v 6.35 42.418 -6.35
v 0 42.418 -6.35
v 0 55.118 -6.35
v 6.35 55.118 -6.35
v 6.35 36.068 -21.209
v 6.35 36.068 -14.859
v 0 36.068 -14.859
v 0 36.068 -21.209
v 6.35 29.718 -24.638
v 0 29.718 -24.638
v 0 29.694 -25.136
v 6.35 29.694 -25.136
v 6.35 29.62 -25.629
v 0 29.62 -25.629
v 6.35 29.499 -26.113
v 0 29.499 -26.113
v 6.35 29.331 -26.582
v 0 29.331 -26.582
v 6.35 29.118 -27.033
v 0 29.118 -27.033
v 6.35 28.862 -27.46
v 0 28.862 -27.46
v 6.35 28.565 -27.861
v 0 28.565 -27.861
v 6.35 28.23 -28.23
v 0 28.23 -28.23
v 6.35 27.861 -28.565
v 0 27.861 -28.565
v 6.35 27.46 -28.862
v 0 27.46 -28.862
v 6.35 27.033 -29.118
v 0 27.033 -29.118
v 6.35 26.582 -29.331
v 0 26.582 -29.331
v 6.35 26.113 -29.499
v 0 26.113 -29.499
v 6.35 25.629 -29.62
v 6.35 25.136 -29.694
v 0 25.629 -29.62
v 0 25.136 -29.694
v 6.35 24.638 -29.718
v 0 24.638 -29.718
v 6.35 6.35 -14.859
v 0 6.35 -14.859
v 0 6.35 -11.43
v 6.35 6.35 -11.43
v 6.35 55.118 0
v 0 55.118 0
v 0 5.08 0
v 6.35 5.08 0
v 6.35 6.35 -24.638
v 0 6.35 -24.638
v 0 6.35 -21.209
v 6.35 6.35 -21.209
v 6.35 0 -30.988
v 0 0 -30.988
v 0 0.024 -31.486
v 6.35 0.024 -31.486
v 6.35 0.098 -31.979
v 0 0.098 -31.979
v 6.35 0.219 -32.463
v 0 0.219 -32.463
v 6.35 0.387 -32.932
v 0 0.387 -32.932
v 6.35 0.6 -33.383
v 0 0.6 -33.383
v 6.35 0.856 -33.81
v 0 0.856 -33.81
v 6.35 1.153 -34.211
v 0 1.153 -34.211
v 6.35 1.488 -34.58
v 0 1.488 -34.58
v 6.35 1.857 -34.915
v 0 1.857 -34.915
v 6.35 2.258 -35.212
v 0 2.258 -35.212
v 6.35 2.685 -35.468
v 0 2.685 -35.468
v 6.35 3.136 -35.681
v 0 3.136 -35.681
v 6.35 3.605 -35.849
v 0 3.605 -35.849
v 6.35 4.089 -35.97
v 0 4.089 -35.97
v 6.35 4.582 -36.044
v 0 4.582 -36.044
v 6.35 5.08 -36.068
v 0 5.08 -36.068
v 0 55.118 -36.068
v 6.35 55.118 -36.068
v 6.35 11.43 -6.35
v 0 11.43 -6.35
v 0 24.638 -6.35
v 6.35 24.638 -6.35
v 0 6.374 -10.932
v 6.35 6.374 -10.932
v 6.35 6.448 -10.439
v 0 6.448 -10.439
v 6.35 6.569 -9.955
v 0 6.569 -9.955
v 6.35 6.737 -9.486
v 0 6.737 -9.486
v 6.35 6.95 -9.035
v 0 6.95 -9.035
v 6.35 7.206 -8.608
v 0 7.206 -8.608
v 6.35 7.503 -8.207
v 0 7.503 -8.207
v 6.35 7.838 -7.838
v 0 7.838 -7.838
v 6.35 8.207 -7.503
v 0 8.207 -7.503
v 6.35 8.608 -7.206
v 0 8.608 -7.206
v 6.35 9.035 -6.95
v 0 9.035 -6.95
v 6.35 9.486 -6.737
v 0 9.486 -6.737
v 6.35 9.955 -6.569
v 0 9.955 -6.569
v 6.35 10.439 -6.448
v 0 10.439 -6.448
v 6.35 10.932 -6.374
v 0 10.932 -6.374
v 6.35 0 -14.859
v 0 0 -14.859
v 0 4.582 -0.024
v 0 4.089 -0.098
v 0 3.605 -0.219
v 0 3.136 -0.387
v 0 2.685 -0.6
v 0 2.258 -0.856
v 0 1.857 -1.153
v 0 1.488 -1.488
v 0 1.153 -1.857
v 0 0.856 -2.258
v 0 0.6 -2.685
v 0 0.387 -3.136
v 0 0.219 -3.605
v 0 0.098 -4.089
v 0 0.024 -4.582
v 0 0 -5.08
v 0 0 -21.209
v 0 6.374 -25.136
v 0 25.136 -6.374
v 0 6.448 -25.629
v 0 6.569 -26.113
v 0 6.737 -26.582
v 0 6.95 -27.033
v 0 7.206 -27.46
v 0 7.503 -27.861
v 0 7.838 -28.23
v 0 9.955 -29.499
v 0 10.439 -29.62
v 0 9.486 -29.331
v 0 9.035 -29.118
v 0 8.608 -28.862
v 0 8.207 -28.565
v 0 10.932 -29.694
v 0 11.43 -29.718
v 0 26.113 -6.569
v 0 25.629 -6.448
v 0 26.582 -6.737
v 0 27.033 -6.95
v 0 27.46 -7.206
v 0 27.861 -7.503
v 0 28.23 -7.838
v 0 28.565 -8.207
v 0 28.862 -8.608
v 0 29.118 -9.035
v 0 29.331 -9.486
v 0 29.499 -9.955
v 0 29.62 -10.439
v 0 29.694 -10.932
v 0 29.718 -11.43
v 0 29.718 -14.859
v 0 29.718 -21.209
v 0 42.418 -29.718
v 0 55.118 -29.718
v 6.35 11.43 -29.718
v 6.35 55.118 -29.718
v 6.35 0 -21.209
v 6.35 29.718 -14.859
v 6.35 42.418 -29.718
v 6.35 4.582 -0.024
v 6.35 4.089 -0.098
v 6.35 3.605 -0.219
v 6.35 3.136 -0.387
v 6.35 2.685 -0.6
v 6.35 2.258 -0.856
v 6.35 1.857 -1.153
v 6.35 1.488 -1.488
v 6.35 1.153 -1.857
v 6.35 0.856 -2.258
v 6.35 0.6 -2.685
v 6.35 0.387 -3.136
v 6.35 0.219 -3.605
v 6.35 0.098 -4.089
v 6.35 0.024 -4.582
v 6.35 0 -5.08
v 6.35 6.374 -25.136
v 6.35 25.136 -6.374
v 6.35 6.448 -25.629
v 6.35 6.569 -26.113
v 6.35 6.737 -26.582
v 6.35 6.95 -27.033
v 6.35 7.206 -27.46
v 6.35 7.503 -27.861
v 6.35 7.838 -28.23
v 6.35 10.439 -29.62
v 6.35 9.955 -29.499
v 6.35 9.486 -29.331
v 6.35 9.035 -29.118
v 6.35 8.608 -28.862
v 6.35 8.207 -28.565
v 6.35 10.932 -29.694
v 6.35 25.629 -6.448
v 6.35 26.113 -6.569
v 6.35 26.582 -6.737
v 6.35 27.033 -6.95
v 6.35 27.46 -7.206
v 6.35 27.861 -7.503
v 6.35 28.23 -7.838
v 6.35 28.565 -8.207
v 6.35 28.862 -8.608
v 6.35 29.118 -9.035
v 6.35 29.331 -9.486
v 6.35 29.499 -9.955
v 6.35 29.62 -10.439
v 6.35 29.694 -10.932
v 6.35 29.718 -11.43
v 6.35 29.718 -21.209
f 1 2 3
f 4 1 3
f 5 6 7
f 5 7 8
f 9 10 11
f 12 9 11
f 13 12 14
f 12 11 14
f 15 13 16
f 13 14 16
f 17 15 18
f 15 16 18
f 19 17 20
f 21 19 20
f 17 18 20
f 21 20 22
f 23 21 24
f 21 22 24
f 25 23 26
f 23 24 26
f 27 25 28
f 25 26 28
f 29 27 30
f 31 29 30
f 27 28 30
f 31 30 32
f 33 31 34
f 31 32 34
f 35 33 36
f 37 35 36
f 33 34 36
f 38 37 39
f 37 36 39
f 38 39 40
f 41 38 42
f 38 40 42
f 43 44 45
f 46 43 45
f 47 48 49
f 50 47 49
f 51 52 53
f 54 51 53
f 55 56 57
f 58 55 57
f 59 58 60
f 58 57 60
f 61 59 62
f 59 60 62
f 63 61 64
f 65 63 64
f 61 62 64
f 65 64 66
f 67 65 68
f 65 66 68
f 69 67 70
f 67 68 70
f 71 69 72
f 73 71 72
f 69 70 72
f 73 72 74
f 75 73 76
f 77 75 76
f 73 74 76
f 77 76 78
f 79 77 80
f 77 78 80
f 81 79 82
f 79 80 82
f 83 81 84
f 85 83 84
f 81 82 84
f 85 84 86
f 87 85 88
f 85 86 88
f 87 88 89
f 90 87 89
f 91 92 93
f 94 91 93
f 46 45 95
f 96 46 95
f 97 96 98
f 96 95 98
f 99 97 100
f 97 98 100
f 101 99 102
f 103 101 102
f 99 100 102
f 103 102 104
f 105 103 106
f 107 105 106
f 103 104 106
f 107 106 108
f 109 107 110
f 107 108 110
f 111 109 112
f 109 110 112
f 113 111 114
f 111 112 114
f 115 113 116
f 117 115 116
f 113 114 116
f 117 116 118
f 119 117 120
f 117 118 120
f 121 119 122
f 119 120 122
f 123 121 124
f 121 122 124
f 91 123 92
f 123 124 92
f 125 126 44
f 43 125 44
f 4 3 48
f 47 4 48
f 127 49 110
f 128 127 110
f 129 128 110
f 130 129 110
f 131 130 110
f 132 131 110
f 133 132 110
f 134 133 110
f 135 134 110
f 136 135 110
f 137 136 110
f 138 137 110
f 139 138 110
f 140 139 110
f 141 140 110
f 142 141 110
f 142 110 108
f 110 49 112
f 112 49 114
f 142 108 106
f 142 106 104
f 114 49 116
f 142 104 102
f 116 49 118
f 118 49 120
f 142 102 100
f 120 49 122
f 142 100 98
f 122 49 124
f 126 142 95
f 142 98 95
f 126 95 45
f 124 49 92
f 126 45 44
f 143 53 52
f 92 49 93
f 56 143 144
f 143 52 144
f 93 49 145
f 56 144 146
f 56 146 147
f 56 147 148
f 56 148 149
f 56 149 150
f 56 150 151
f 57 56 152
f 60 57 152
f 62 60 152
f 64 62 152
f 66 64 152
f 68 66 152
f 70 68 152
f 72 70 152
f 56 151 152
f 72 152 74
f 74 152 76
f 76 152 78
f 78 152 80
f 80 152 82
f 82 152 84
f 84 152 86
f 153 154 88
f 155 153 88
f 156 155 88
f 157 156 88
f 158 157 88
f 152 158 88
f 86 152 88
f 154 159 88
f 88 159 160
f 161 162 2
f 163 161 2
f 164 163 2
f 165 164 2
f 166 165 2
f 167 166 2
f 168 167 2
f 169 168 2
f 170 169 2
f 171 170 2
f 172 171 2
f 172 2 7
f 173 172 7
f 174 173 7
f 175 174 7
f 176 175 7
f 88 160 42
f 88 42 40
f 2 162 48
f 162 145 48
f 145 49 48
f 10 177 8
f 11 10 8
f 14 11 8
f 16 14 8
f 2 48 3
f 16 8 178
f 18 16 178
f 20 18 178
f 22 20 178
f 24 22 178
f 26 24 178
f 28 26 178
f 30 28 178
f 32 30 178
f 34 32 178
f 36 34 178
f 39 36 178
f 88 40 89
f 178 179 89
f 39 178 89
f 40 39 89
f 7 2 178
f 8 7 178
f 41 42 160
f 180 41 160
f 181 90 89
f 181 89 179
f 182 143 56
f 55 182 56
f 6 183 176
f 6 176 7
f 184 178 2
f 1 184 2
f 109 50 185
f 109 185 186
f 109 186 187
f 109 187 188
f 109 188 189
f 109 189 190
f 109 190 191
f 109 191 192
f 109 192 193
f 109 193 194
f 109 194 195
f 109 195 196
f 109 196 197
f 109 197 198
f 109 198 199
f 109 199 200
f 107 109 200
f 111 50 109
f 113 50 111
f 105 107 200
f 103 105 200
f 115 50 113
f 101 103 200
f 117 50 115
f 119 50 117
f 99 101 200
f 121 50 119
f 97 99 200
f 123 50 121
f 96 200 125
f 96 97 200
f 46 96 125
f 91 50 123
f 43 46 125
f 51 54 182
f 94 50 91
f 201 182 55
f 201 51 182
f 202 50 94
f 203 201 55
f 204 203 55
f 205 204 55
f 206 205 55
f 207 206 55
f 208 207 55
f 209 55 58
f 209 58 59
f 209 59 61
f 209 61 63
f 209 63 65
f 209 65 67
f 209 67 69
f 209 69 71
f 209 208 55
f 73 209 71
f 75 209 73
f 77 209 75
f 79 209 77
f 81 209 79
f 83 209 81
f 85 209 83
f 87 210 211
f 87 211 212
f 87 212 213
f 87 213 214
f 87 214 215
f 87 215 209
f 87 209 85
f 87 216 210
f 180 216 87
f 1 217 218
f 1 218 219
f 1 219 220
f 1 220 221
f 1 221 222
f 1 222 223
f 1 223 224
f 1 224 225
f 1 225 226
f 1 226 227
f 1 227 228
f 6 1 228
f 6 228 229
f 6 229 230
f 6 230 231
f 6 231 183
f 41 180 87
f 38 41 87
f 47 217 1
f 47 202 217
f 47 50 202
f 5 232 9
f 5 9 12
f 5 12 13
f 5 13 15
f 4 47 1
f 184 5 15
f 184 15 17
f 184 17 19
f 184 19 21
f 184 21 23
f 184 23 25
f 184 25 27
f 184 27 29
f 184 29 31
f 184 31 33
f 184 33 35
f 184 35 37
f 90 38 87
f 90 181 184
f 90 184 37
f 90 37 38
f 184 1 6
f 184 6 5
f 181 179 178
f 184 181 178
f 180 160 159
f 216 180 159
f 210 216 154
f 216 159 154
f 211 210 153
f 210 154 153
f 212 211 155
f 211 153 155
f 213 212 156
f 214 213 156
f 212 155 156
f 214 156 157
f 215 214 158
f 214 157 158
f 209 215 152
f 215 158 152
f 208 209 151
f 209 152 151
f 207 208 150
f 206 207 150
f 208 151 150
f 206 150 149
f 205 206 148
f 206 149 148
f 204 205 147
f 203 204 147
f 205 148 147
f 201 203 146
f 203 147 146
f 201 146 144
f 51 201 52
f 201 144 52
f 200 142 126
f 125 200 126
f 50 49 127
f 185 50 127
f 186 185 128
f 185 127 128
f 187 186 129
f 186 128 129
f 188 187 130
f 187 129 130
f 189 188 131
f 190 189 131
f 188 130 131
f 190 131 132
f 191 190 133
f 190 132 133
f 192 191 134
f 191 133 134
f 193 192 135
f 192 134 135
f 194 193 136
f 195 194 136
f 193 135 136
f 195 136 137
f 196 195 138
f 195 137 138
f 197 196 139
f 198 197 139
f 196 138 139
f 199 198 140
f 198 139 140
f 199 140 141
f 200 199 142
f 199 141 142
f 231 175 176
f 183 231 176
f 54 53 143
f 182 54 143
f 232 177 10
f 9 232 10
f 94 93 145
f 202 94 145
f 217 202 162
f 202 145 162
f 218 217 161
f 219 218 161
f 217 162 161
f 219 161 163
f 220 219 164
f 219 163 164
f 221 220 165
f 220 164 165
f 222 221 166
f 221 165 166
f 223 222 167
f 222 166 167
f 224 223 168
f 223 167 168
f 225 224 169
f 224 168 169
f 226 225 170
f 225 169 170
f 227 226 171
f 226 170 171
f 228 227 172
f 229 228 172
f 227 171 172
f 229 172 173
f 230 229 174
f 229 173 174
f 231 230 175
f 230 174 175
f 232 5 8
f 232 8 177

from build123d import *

# Parameters (mm, degrees)
BOSS_EXTRUDE1_DEPTH = 6.35


with BuildPart() as part:
    # Sketch2 → Boss-Extrude1 (new body)
    with BuildSketch(Plane(origin=(0, 0, 0), x_dir=(0, 0, -1), z_dir=(1, 0, 0))):
        with BuildLine():
            Line((21.209, 0), (30.988, 0))
            ThreePointArc((30.988, 0), (34.580102448, 1.487897552), (36.068, 5.08))
            Line((36.068, 5.08), (36.068, 36.068))
            Line((36.068, 36.068), (36.068, 55.118))
            Line((36.068, 55.118), (29.718, 55.118))
            Line((29.718, 55.118), (29.718, 42.418))
            Line((29.718, 42.418), (6.35, 42.418))
            Line((6.35, 42.418), (6.35, 55.118))
            Line((6.35, 55.118), (0, 55.118))
            Line((0, 55.118), (0, 36.068))
            Line((0, 36.068), (0, 5.08))
            ThreePointArc((0, 5.08), (1.487897552, 1.487897552), (5.08, 0))
            Line((5.08, 0), (14.859, 0))
            Line((14.859, 0), (14.859, 6.35))
            Line((14.859, 6.35), (11.43, 6.35))
            ThreePointArc((11.43, 6.35), (7.837897552, 7.837897552), (6.35, 11.43))
            Line((6.35, 11.43), (6.35, 24.638))
            ThreePointArc((6.35, 24.638), (7.837897552, 28.230102448), (11.43, 29.718))
            Line((11.43, 29.718), (14.859, 29.718))
            Line((14.859, 29.718), (14.859, 36.068))
            Line((14.859, 36.068), (21.209, 36.068))
            Line((21.209, 36.068), (21.209, 29.718))
            Line((21.209, 29.718), (24.638, 29.718))
            ThreePointArc((24.638, 29.718), (28.230102448, 28.230102448), (29.718, 24.638))
            Line((29.718, 24.638), (29.718, 11.43))
            ThreePointArc((29.718, 11.43), (28.230102448, 7.837897552), (24.638, 6.35))
            Line((24.638, 6.35), (21.209, 6.35))
            Line((21.209, 6.35), (21.209, 0))
        make_face()
    extrude(amount=BOSS_EXTRUDE1_DEPTH)


solid = part.part
